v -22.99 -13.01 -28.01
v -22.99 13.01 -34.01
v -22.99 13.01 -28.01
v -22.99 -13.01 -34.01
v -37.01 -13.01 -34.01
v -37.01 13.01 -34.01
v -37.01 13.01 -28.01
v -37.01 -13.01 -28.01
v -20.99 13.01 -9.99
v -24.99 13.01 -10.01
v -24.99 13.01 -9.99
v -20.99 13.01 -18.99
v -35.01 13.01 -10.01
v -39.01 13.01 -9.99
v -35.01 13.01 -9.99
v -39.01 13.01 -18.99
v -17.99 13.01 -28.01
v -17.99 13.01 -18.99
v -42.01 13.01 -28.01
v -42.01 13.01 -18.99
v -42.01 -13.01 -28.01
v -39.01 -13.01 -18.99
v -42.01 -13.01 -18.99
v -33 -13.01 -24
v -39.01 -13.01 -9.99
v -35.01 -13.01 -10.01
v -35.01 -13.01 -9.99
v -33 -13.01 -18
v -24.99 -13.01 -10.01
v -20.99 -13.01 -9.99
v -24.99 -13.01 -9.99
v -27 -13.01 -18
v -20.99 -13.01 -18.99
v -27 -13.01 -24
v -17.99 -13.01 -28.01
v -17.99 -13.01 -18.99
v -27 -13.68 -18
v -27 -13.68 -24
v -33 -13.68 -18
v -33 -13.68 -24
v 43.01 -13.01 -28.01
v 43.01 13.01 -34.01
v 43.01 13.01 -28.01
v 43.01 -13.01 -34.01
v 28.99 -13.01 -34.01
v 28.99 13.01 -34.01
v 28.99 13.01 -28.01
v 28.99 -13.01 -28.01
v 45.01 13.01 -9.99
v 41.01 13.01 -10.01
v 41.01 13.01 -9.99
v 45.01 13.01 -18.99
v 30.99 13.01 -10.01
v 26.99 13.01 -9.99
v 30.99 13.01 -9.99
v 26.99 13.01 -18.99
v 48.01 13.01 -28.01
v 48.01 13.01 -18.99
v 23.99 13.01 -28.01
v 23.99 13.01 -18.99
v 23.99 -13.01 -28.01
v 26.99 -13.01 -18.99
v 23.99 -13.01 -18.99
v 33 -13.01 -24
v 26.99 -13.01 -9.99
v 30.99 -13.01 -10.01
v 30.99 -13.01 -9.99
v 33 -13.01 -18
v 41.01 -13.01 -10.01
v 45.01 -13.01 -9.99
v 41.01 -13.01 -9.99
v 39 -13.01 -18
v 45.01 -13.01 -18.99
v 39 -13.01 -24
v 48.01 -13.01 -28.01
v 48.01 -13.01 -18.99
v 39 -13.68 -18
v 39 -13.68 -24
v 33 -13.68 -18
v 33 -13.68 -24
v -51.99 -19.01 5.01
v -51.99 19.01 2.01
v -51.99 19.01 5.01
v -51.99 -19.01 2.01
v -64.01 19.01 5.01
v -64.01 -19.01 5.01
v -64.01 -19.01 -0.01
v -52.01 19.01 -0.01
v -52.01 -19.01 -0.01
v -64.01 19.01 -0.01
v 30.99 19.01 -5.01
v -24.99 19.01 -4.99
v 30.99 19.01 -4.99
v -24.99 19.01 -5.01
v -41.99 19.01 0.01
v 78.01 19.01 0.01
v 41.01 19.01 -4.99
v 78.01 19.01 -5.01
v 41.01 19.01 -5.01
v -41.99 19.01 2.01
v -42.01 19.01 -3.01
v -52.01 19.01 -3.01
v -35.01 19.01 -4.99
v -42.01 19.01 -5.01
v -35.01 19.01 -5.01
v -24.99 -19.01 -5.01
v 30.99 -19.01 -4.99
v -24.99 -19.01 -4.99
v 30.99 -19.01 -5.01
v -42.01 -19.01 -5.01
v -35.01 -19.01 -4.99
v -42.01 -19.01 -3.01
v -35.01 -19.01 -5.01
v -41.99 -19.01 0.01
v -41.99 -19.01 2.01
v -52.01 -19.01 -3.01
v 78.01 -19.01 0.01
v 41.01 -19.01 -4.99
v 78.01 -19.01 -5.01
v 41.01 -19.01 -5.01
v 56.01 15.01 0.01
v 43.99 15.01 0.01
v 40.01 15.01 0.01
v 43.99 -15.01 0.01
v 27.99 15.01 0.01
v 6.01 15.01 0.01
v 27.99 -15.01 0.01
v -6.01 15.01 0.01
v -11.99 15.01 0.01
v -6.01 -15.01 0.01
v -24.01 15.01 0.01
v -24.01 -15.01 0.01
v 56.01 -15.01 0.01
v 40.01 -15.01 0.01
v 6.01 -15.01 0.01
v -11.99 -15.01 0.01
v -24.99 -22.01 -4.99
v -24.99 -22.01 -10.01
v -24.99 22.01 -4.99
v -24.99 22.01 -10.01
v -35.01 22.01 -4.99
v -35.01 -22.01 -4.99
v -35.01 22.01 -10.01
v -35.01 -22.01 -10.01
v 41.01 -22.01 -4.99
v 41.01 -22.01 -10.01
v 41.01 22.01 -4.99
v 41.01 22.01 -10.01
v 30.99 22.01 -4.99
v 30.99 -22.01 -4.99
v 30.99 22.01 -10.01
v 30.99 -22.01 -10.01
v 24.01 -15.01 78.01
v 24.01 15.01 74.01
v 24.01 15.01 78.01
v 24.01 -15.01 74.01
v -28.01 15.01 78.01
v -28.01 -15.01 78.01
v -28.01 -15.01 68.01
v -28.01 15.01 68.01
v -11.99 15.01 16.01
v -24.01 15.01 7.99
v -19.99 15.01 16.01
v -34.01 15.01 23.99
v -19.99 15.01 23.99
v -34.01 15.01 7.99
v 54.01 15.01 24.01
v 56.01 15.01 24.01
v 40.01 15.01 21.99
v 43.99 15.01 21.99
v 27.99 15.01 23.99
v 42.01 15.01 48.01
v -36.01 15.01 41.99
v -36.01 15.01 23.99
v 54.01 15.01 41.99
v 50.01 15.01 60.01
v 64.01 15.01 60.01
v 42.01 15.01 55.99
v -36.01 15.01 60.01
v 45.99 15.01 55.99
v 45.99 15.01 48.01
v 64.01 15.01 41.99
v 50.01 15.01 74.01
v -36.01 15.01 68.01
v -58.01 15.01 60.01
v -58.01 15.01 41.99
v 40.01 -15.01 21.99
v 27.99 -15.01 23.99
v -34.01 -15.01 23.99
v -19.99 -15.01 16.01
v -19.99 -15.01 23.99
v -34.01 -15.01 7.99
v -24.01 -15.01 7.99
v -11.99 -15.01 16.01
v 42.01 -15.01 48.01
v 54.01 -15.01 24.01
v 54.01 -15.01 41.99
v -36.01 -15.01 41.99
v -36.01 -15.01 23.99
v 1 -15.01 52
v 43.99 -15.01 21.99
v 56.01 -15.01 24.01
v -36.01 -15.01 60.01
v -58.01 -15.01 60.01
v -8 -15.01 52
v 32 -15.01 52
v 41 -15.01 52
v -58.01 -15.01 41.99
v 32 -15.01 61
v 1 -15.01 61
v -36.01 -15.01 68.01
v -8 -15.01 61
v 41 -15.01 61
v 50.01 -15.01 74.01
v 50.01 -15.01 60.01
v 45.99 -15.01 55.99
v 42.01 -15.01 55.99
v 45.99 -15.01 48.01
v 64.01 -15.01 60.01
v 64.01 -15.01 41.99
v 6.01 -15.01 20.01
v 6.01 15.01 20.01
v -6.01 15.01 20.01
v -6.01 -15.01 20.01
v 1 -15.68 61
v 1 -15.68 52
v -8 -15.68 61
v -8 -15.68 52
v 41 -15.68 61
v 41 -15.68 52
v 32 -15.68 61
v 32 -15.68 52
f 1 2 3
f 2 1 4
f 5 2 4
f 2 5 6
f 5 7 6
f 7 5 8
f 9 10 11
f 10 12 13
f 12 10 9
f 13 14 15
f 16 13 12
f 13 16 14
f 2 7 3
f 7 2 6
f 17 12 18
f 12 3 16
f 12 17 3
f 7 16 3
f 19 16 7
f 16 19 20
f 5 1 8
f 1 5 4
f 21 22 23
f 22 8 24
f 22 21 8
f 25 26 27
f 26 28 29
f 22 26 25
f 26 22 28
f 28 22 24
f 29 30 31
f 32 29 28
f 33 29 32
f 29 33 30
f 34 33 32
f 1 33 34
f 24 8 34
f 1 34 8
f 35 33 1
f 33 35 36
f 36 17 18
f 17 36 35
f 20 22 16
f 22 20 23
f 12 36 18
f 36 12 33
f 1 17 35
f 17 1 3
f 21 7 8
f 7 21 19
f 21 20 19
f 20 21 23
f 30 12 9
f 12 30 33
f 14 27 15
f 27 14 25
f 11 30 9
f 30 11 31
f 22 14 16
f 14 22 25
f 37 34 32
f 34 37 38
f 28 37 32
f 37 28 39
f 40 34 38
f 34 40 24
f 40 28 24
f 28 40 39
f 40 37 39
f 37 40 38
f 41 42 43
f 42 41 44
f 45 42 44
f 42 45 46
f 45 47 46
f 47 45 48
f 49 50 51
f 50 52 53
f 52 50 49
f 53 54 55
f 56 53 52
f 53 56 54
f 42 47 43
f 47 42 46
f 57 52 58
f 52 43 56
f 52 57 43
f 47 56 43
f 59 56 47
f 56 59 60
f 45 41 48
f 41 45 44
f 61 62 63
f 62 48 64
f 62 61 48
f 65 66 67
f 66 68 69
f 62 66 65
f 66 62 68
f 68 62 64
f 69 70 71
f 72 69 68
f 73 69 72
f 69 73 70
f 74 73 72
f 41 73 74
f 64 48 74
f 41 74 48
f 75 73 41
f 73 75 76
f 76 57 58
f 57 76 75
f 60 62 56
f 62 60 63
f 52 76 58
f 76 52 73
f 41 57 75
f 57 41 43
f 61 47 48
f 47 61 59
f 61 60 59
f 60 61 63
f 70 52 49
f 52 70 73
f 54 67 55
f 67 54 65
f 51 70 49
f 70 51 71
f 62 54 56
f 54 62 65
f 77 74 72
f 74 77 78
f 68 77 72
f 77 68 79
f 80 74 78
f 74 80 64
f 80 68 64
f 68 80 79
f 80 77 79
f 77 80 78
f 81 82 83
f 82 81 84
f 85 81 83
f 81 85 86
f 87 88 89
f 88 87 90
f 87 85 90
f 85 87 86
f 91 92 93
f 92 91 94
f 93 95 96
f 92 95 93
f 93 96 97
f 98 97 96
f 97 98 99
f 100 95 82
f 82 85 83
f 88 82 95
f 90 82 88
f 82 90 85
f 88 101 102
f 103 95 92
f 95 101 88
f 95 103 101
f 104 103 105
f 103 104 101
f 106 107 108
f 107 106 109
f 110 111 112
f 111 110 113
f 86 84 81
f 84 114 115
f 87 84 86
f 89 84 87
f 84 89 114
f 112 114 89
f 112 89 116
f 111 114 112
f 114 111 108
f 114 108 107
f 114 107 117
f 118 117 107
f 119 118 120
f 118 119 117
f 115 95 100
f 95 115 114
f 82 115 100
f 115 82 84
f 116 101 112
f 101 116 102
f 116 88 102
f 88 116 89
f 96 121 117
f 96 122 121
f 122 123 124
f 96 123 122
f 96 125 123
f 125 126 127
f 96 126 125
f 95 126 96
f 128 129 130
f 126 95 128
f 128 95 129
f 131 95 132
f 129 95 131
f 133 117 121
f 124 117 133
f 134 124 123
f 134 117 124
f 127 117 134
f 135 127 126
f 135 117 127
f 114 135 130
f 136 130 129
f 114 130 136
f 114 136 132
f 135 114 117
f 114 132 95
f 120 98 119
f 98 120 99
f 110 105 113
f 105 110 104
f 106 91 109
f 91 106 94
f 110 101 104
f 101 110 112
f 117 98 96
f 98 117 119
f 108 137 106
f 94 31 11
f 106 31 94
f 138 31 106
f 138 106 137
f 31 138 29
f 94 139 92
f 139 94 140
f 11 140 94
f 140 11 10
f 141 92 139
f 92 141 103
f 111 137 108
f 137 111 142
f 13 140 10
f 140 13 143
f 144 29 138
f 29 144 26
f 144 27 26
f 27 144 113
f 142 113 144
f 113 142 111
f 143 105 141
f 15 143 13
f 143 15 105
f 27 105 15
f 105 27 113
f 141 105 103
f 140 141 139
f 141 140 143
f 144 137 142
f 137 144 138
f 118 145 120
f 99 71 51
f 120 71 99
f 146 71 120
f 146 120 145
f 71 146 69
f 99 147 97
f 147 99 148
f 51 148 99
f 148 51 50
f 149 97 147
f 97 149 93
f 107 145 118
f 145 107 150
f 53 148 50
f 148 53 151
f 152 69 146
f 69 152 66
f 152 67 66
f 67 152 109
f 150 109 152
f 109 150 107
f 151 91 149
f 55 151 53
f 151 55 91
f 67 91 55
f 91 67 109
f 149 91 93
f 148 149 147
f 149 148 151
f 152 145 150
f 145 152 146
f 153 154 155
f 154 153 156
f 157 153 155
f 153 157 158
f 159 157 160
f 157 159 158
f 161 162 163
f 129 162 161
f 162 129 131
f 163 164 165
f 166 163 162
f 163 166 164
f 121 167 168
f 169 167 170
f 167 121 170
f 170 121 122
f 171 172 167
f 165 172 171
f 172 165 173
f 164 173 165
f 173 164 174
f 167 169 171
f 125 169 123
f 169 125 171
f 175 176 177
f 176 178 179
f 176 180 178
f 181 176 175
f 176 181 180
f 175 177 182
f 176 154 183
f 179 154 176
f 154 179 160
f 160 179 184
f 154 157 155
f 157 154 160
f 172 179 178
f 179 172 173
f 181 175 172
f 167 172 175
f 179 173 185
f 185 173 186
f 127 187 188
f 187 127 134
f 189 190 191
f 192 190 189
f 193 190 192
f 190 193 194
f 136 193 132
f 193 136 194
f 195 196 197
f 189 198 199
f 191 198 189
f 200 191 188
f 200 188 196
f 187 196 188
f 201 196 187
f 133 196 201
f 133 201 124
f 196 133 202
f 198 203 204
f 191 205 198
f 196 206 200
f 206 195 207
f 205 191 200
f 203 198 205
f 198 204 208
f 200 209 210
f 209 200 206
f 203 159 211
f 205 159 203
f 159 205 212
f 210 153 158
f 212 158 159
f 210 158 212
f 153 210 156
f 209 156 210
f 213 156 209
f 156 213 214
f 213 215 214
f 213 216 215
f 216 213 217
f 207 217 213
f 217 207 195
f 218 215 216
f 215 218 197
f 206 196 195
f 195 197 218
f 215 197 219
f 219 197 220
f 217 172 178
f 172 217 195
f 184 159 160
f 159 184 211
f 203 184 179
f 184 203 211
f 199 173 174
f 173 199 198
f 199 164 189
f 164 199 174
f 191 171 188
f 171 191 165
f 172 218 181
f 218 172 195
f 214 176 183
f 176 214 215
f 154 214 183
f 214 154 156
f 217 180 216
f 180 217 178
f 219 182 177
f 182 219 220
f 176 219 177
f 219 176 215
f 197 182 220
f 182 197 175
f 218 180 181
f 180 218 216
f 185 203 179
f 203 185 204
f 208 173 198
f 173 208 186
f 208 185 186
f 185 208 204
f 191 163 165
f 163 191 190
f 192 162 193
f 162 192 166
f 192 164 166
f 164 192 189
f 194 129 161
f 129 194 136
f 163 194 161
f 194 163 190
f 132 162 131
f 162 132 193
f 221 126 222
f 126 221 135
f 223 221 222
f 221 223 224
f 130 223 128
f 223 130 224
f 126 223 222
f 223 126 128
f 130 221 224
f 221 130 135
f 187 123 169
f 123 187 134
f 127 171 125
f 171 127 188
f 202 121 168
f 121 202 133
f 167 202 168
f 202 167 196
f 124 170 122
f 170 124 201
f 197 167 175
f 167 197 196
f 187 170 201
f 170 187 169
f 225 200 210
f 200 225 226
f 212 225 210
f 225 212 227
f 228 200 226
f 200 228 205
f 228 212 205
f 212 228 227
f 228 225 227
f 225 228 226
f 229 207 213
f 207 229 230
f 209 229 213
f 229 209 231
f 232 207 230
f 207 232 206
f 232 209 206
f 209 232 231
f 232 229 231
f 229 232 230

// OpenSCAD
// Skateboard Charm - Version 005
// Reference: references/17_clawd_skateboard.png
// Changes from previous version:
// - Increased overall model depth for a stronger 3D block presence.
// - Removed all darker orange sticker/shadow patches from Clawd.
// - Rebuilt the skateboard stack so deck, trucks, and wheels touch cleanly without vertical overlap.

eps = 0.02;
$fn = 32;

body_d = 30;
deck_d = 38;
truck_d = 44;
wheel_d = 26;
face_d = 0.7;

orange = [0.96, 0.45, 0.29];
black = [0.02, 0.02, 0.02];
maroon = [0.34, 0.07, 0.16];
wheel_yellow = [1.00, 0.68, 0.28];
axle_gray = [0.35, 0.34, 0.34];

module block(x, z, w, h, d, material, y = 0) {
    color(material)
        translate([x + w / 2, y, z + h / 2])
            cube([w + eps, d + eps, h + eps], center = true);
}

module face_block(x, z, w, h, material, host_d = body_d) {
    color(material)
        translate([x + w / 2, -host_d / 2 - face_d / 2 + eps, z + h / 2])
            cube([w, face_d, h], center = true);
}

module clawd_body() {
    // Block figure built from simple cuboids. The front silhouette follows the
    // reference, but no printed/sticker shadow patches are modeled.
    block(-28, 62, 52, 16, body_d, orange);       // top head step
    block(-36, 44, 78, 24, body_d, orange);       // main face/body
    block(-36, 24, 54, 22, body_d, orange);       // lower left body
    block(18, 24, 30, 24, body_d, orange);        // lower right body
    block(24, 56, 26, 18, body_d, orange);        // upper right step
    block(46, 42, 18, 18, body_d, orange);        // right cheek protrusion
    block(-58, 42, 24, 18, body_d, orange);       // left cheek protrusion

    // Blocky legs and dangling lower pixels. Lowest faces sit on the deck top.
    block(-34, 8, 14, 26, body_d, orange);
    block(-24, 0, 12, 16, body_d, orange);
    block(-6, 0, 12, 20, body_d, orange);
    block(28, 0, 12, 24, body_d, orange);
    block(44, 0, 12, 24, body_d, orange);
    block(40, 22, 14, 20, body_d, orange);

    // Raised square eyes on the front face.
    face_block(-8, 52, 9, 9, black);
    face_block(32, 52, 9, 9, black);
}

module deck_block(x, z, w, h) {
    block(x, z, w, h, deck_d, maroon);
}

module truck(cx) {
    // Truck top touches the deck underside at z=-5. Wheels touch the truck
    // underside at z=-10, avoiding stacked intersections.
    block(cx - 5, -10, 10, 5, truck_d, axle_gray);
}

module pixel_wheel(cx) {
    // Pixel wheels are chunky cuboid clusters with no overlap into the deck.
    block(cx - 7, -34, 14, 6, wheel_d, wheel_yellow);
    block(cx - 12, -28, 24, 9, wheel_d, wheel_yellow);
    block(cx - 9, -19, 18, 9, wheel_d, wheel_yellow);
    face_block(cx - 3, -24, 6, 6, maroon, wheel_d);
}

module pixel_skateboard() {
    // Pixel skateboard side profile. Adjacent blocks meet at faces instead of
    // occupying the same space.
    deck_block(-64, 0, 12, 5);    // stepped nose
    deck_block(-52, -3, 10, 5);
    deck_block(-42, -5, 94, 5);   // main deck under the figure
    deck_block(52, -5, 26, 5);    // right tail extension

    truck(-30);
    truck(36);

    pixel_wheel(-30);
    pixel_wheel(36);
}

module model() {
    union() {
        pixel_skateboard();
        clawd_body();
    }
}

model();
